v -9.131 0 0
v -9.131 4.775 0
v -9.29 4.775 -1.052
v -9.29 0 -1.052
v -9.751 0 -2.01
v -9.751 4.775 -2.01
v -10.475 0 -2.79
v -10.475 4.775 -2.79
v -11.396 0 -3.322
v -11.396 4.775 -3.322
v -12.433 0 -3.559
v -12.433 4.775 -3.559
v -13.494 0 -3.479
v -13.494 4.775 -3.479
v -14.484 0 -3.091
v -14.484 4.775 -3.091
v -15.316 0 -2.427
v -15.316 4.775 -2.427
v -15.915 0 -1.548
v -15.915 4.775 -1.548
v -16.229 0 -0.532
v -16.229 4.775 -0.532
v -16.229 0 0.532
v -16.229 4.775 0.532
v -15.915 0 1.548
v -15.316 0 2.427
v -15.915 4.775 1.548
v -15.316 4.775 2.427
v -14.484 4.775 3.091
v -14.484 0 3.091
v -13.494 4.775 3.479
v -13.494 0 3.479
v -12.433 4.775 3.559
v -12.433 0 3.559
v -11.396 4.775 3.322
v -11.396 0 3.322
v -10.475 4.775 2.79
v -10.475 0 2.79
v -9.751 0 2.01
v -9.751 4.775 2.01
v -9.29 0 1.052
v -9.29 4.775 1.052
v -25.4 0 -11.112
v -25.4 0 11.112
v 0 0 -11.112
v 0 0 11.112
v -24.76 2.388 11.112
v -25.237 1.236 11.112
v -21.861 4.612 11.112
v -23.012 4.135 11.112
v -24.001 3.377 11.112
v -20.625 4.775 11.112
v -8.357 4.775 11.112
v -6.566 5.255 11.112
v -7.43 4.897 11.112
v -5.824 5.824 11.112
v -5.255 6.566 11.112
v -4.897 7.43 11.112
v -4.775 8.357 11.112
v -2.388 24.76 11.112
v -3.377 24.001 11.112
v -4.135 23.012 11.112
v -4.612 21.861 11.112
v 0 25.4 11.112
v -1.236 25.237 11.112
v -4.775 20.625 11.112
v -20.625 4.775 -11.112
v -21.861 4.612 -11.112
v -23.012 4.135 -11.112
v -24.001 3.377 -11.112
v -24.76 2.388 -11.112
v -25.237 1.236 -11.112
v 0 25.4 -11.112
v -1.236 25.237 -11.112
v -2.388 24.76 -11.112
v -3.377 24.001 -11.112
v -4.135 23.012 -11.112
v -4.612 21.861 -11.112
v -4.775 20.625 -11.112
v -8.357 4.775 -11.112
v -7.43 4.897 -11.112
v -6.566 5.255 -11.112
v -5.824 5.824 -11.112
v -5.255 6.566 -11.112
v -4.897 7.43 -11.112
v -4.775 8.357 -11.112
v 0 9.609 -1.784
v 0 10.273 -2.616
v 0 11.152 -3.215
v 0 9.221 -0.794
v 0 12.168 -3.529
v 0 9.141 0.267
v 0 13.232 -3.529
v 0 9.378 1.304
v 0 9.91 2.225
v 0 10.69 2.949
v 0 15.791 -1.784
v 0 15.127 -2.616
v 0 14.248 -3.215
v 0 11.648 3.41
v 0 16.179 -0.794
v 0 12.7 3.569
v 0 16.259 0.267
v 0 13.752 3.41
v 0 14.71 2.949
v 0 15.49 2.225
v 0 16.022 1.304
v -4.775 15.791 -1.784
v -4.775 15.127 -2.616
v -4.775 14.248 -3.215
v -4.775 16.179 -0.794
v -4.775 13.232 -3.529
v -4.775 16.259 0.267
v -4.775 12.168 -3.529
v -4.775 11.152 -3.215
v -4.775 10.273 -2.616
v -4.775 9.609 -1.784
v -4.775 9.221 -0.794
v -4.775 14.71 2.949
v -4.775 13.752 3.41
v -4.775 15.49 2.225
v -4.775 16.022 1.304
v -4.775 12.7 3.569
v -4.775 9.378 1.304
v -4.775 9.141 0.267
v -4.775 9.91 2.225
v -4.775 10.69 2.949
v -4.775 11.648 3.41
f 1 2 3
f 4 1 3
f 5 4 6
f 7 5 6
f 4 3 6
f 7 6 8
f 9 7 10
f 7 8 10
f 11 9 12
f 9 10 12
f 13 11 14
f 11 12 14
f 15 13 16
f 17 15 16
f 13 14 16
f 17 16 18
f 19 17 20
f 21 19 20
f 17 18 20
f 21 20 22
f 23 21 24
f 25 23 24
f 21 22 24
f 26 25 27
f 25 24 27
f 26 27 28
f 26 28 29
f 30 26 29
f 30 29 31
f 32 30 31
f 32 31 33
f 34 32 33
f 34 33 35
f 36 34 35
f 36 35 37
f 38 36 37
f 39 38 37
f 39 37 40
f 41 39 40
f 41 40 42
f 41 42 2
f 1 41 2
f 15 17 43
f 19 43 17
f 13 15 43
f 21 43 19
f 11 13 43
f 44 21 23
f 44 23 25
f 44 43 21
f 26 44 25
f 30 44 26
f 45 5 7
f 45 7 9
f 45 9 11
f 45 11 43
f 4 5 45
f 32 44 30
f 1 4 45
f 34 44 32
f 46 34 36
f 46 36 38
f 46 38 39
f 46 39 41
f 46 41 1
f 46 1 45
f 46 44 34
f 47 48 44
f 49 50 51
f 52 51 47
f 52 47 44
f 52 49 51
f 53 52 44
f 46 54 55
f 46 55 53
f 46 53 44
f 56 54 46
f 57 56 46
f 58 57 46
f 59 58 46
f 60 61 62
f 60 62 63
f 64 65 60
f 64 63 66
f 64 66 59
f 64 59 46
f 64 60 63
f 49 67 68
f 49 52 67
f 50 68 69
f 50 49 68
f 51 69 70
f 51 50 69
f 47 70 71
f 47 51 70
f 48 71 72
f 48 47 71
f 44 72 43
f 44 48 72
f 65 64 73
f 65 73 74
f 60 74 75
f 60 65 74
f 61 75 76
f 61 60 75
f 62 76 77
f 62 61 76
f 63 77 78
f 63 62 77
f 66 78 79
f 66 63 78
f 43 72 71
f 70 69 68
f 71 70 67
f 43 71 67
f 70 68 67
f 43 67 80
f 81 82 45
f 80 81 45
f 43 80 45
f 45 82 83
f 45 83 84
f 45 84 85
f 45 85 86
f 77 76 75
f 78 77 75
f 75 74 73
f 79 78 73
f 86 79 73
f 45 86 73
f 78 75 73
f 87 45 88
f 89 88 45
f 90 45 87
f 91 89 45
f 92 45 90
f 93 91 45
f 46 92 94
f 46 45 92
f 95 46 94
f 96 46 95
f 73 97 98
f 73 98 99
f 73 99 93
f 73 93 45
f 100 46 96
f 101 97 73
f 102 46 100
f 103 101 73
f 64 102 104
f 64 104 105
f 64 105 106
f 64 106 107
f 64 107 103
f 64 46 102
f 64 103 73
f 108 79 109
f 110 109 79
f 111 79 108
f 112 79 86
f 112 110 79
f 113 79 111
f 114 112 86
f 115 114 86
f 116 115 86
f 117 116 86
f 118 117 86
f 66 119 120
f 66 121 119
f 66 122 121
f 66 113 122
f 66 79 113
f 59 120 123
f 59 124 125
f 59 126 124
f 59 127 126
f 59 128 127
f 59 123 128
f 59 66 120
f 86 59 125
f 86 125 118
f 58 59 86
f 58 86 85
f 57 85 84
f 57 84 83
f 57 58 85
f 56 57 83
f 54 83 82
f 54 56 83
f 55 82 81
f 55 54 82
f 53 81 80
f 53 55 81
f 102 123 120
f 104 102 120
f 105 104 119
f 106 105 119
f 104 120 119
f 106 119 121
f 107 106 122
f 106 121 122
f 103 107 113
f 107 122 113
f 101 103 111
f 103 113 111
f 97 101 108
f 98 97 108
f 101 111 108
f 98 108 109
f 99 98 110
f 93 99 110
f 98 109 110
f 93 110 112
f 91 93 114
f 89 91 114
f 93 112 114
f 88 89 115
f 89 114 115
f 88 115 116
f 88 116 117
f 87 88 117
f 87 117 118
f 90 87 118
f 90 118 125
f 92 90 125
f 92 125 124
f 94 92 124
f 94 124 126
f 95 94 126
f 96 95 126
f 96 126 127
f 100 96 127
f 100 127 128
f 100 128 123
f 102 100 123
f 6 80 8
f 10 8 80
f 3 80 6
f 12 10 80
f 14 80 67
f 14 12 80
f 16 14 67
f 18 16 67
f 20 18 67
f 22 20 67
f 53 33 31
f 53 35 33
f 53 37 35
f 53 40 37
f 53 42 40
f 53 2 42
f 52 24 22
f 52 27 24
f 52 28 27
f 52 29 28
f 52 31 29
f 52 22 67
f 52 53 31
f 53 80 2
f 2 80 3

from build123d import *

# Parameters (mm, degrees)
EXTRUDE1_DEPTH     = 11.1125
SKETCH2_R          = 3.5687
CUT_EXTRUDE1_DEPTH = 5.7752
SKETCH3_R          = 3.5687
CUT_EXTRUDE2_DEPTH = 5.7752


with BuildPart() as part:
    # Sketch1 → Extrude1 (new body, symmetric)
    with BuildSketch(Plane.XY):
        with BuildLine():
            Line((0, 0), (0, 25.4))
            ThreePointArc((0, 25.4), (-3.376576302, 24.001376302), (-4.7752, 20.6248))
            Line((-4.7752, 20.6248), (-4.7752, 8.3566))
            ThreePointArc((-4.7752, 8.3566), (-5.824167774, 5.824167774), (-8.3566, 4.7752))
            Line((-8.3566, 4.7752), (-20.6248, 4.7752))
            ThreePointArc((-20.6248, 4.7752), (-24.001376302, 3.376576302), (-25.4, 0))
            Line((-25.4, 0), (0, 0))
        make_face()
    extrude(amount=EXTRUDE1_DEPTH, both=True)

    # Sketch2 → Cut-Extrude1 (cut, through all)
    with BuildSketch(Plane(origin=(0, 4.7752, 0), x_dir=(1, 0, 0), z_dir=(0, 1, 0))):
        with Locations((-12.7, 0)):
            Circle(SKETCH2_R)
    extrude(amount=-CUT_EXTRUDE1_DEPTH, mode=Mode.SUBTRACT)

    # Sketch3 → Cut-Extrude2 (cut, through all)
    with BuildSketch(Plane.ZY.offset(4.7752)):
        with Locations((0, 12.7)):
            Circle(SKETCH3_R)
    extrude(amount=-CUT_EXTRUDE2_DEPTH, mode=Mode.SUBTRACT)


solid = part.part
